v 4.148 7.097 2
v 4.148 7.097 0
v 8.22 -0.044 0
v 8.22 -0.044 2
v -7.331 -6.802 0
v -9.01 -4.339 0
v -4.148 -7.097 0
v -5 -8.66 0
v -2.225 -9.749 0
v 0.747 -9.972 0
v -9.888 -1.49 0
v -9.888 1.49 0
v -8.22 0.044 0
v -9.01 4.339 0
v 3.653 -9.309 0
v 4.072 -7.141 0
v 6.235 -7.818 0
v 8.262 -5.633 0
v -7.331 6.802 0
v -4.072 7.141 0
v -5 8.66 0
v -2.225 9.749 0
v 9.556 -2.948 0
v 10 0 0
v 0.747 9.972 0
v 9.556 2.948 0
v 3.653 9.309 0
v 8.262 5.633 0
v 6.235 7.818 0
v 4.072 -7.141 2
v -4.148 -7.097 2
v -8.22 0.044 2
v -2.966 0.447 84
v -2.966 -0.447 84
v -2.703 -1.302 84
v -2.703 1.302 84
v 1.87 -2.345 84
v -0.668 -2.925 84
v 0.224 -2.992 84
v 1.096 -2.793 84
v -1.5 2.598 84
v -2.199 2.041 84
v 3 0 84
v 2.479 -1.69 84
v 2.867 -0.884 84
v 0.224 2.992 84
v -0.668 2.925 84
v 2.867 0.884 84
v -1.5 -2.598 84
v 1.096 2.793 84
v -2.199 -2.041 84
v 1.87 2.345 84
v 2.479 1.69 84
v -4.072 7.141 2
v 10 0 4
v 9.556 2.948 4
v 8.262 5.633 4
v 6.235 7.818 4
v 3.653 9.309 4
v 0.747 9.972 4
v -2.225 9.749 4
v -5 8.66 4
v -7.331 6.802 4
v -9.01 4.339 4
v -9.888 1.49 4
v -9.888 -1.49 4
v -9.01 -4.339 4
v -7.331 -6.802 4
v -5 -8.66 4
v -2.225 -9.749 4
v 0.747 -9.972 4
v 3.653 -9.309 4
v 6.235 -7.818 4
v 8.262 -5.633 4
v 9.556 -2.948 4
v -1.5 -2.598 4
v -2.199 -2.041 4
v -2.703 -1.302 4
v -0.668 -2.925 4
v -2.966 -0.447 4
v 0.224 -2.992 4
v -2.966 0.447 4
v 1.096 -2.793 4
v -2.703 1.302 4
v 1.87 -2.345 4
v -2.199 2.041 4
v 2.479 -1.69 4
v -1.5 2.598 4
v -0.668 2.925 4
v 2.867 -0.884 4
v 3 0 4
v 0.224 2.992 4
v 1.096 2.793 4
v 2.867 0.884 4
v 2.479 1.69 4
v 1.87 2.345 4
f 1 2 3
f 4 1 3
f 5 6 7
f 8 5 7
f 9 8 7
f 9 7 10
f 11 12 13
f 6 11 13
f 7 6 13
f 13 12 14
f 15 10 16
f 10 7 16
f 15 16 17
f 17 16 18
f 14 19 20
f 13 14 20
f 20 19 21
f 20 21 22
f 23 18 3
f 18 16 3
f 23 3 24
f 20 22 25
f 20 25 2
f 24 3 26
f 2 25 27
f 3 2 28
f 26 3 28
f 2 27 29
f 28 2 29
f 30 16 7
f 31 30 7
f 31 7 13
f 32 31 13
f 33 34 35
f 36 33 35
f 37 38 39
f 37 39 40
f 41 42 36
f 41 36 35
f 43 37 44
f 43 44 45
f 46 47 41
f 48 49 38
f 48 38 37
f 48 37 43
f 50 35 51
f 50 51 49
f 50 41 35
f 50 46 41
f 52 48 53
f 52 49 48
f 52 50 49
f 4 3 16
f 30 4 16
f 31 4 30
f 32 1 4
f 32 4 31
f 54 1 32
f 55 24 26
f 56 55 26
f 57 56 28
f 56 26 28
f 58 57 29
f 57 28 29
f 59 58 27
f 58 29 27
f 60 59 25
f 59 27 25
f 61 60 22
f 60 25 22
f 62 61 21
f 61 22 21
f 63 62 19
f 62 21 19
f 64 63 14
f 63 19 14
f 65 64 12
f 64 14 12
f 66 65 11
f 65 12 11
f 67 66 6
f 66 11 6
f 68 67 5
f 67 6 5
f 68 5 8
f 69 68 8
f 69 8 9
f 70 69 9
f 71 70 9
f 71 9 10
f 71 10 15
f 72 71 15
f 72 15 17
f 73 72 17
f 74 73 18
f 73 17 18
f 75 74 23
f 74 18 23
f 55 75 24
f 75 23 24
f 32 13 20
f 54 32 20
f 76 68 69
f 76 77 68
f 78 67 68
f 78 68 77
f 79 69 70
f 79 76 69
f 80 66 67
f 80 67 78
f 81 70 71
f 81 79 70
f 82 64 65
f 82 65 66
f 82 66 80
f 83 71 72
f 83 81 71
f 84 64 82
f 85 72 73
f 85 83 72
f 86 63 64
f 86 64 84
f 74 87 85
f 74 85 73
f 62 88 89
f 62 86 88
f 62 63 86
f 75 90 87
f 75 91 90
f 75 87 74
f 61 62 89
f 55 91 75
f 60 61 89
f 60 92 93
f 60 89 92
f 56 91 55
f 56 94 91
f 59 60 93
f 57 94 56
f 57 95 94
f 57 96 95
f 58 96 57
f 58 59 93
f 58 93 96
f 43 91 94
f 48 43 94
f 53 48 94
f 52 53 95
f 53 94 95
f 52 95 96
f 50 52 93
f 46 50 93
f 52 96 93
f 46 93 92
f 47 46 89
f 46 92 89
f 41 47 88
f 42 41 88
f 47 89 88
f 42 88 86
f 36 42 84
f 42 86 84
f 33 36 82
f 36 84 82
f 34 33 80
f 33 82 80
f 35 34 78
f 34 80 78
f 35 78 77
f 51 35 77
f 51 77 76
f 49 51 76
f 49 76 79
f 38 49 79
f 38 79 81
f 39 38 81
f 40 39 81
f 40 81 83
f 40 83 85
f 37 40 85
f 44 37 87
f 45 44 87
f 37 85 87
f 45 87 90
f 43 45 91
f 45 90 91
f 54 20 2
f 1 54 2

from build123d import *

# Parameters (mm, degrees)
SKETCH1_R           = 10
BOSS_EXTRUDE1_DEPTH = 4
SKETCH2_R           = 3
BOSS_EXTRUDE2_DEPTH = 80
CUT_EXTRUDE1_DEPTH  = 2


with BuildPart() as part:
    # Sketch1 → Boss-Extrude1 (new body)
    with BuildSketch(Plane.XY):
        Circle(SKETCH1_R)
    extrude(amount=BOSS_EXTRUDE1_DEPTH)

    # Sketch2 → Boss-Extrude2 (add)
    with BuildSketch(Plane.XY.offset(4)):
        Circle(SKETCH2_R)
    extrude(amount=BOSS_EXTRUDE2_DEPTH)

    # Sketch3 → Cut-Extrude1 (cut)
    with BuildSketch(Plane(origin=(0, 0, 0), x_dir=(-1, 0, 0), z_dir=(0, 0, -1))):
        Polygon((-4.148384256, 7.097061567), (-8.220427737, -0.044075367), (-4.072043481, -7.141136934), (4.148384256, -7.097061567), (8.220427737, 0.044075367), (4.072043481, 7.141136934), align=None)
    extrude(amount=-CUT_EXTRUDE1_DEPTH, mode=Mode.SUBTRACT)


solid = part.part
